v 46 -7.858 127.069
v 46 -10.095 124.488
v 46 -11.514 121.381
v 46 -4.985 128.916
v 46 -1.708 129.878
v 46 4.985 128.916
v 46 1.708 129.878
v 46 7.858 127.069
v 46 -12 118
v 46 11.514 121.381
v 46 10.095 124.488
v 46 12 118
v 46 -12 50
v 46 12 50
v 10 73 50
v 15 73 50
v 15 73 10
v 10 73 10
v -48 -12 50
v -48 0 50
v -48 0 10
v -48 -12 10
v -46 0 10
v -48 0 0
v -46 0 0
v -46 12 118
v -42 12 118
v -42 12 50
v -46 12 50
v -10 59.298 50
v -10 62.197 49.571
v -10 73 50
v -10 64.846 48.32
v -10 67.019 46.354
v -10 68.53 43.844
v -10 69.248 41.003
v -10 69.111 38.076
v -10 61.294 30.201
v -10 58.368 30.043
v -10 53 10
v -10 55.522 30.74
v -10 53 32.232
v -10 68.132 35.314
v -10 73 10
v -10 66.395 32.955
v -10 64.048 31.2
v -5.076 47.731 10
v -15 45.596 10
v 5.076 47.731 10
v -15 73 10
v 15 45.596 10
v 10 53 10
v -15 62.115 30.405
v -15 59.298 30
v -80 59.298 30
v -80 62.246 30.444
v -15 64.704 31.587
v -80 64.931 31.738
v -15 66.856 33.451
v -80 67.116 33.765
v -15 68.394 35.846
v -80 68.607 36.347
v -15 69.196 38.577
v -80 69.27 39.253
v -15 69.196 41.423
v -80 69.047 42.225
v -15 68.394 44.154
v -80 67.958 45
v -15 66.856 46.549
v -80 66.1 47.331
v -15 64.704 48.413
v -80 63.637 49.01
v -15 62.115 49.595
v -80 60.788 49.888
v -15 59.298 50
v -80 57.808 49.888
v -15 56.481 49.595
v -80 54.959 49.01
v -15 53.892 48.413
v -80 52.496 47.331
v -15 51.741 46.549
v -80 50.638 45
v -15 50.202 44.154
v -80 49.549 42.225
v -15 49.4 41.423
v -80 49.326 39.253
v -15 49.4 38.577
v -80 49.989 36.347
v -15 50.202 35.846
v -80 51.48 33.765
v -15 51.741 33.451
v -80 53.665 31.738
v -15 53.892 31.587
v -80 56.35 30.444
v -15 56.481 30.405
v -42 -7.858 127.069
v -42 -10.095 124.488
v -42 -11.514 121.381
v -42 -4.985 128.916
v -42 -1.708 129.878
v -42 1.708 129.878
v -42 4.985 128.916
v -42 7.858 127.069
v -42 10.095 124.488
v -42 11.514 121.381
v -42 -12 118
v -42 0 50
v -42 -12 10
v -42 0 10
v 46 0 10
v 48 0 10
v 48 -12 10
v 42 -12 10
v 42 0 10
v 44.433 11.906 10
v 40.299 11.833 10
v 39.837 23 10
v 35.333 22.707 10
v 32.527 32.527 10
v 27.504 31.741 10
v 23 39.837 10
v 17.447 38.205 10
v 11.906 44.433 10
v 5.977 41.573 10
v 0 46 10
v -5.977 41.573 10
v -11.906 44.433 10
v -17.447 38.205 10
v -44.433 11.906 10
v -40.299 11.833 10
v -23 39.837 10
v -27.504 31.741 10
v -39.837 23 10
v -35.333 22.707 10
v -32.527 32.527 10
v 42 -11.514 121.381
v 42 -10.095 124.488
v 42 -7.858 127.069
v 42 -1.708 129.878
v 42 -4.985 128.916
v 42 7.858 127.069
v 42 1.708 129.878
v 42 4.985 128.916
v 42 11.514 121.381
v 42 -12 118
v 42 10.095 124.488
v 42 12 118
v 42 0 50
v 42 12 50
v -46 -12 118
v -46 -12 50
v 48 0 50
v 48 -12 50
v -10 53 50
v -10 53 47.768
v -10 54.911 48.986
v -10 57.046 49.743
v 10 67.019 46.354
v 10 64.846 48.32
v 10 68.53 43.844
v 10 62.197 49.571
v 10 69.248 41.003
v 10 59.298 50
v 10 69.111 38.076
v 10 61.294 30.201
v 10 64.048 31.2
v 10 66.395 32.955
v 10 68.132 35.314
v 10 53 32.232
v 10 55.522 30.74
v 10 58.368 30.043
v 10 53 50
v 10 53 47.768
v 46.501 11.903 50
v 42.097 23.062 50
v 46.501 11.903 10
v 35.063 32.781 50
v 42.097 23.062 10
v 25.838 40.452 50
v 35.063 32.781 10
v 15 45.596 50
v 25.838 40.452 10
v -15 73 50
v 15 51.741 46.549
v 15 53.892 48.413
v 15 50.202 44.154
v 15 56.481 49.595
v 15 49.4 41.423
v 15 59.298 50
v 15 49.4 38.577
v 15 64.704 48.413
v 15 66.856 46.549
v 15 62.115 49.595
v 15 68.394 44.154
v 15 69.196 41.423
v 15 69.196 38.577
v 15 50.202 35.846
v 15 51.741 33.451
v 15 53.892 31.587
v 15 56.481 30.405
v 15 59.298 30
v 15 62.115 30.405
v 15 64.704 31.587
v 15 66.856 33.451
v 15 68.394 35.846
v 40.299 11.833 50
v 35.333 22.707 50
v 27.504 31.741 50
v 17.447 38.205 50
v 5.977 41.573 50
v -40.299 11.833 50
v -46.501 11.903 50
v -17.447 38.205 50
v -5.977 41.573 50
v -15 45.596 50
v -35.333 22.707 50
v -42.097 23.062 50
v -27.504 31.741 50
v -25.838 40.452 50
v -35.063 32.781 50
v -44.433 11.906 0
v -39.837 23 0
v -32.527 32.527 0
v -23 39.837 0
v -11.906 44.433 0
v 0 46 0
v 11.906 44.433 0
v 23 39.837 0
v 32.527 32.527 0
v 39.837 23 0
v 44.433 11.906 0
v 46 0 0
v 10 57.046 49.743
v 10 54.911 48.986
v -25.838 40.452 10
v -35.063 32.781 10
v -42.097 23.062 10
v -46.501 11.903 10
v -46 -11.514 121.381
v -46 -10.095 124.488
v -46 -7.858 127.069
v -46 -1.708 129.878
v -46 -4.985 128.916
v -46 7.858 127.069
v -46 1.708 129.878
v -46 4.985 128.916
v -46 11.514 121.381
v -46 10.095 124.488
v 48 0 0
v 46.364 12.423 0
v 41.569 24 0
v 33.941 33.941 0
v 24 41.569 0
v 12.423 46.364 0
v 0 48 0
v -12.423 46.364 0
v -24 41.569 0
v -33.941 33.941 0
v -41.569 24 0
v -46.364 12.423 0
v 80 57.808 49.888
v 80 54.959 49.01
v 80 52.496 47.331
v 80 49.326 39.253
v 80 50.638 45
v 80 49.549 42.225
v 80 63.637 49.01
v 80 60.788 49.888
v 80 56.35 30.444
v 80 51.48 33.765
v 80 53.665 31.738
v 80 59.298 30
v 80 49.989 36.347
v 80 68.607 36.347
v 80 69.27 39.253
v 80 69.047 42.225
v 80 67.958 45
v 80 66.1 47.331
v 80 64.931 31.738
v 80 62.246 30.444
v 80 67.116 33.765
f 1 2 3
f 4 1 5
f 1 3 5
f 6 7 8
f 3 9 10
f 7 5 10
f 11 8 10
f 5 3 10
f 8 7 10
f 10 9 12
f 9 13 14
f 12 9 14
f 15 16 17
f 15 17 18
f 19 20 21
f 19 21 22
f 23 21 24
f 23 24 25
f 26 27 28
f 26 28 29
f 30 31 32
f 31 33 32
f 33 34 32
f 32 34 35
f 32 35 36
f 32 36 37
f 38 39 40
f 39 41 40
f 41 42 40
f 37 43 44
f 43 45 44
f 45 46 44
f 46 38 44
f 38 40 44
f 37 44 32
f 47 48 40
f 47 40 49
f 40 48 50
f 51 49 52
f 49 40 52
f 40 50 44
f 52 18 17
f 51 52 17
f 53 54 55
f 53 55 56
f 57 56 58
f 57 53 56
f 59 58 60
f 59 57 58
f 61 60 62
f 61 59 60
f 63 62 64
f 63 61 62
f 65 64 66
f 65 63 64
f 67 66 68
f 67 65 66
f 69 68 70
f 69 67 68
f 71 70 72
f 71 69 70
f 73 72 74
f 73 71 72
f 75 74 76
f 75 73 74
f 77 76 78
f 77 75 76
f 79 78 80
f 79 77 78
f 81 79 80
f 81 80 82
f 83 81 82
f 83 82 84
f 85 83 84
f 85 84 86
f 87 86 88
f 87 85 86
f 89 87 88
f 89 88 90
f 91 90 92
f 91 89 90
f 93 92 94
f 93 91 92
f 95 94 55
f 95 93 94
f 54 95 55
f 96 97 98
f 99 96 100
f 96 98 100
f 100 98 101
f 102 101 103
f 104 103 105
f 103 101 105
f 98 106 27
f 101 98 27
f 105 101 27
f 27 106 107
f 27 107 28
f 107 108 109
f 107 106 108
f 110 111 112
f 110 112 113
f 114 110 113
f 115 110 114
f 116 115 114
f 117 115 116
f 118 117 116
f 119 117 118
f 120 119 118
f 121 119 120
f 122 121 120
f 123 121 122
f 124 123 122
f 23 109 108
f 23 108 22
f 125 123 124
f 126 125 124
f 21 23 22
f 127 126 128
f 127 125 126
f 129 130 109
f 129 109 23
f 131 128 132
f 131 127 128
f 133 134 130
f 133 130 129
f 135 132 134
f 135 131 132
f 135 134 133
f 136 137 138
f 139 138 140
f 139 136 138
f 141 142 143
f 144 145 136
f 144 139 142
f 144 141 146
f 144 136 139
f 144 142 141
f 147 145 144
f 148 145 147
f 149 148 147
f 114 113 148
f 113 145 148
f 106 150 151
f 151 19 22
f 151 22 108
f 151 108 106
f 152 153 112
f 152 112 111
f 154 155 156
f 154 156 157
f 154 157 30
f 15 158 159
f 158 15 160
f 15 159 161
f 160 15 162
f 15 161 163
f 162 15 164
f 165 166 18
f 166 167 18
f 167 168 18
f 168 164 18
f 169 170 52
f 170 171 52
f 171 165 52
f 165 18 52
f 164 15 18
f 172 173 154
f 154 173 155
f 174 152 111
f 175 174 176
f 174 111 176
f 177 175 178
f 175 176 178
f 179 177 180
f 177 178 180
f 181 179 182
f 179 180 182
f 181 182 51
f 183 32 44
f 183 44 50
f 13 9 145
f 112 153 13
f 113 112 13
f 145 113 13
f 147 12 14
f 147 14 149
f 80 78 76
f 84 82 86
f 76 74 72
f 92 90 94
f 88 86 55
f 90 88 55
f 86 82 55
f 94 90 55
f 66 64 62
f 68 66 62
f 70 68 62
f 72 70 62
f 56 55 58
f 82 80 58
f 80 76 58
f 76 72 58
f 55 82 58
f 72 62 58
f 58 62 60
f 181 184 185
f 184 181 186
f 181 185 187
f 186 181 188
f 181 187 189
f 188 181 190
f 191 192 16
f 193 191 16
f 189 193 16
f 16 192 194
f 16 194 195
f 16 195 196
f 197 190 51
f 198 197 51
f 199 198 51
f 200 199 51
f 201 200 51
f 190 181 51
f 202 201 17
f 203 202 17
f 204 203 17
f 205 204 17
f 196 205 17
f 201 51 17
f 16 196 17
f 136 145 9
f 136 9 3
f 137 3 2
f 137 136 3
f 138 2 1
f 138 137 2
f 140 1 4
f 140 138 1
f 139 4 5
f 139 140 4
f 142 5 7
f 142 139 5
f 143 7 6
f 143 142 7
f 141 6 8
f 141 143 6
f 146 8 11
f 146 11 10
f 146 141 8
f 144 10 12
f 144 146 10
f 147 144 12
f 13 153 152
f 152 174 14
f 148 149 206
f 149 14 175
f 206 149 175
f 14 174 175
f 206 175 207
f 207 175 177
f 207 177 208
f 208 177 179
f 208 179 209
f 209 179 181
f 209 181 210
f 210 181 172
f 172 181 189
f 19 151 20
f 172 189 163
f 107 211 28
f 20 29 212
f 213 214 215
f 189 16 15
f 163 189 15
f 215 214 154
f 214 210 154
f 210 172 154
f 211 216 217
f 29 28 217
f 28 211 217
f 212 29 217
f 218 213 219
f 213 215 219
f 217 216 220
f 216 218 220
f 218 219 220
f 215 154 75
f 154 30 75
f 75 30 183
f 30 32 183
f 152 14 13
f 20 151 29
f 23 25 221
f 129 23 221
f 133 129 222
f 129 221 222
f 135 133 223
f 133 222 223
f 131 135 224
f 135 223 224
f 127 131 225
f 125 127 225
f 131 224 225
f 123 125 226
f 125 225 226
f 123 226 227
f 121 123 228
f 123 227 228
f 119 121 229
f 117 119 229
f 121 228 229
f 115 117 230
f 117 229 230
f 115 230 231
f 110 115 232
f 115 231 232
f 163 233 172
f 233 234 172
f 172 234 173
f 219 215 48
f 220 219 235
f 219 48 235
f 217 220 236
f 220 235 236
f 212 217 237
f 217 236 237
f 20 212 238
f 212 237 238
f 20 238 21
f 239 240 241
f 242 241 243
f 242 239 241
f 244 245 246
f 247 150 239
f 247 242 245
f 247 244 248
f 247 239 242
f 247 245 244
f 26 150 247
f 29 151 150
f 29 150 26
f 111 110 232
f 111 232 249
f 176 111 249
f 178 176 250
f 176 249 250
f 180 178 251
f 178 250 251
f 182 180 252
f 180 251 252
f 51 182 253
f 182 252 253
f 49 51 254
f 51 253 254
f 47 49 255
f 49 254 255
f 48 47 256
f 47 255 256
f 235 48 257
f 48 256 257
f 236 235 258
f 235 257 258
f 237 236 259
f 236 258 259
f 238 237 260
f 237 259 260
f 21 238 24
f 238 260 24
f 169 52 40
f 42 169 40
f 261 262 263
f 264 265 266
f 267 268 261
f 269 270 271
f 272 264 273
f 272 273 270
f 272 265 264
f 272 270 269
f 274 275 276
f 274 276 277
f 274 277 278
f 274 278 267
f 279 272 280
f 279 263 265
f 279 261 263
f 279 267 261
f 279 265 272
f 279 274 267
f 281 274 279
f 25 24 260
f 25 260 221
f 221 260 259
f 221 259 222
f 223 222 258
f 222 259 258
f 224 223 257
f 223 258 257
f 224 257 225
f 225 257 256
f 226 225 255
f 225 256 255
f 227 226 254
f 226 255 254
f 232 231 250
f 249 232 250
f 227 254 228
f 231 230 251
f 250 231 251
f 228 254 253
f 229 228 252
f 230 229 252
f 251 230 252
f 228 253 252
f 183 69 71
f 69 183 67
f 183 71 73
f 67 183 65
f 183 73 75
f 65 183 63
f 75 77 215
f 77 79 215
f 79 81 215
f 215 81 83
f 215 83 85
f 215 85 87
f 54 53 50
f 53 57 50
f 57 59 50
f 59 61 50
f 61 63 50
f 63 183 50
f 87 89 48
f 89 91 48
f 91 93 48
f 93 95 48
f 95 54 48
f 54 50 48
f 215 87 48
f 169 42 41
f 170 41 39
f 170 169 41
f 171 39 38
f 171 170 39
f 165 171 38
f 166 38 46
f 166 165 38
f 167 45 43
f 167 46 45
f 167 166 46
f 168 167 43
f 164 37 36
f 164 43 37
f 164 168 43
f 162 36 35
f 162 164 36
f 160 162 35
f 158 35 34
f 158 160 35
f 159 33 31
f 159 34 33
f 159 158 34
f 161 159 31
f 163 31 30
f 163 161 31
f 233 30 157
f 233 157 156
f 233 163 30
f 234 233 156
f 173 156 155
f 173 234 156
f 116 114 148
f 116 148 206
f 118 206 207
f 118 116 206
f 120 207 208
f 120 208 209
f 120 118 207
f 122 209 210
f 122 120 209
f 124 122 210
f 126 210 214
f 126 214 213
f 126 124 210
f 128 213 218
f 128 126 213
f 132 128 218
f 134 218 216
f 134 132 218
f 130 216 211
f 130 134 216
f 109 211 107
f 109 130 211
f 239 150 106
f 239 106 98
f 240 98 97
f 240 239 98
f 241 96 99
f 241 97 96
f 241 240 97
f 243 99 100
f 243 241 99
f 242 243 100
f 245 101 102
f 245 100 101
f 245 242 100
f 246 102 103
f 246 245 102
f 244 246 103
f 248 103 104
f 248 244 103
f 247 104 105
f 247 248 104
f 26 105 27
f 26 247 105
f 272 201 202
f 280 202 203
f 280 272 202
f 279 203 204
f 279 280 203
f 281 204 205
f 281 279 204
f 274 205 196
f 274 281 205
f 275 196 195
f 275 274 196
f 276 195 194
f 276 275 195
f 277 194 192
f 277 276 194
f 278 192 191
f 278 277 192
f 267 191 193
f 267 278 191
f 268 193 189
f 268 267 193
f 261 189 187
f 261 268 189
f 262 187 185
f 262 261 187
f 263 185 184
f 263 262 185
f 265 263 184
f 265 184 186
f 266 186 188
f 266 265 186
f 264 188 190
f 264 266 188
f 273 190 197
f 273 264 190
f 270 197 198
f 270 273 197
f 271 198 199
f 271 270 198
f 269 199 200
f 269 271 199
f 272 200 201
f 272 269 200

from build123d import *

# Parameters (mm, degrees)
EXTRUDE_1_DEPTH     = 10
EXTRUDE_2_DEPTH     = 40
EXTRUDE_4_DEPTH     = 40
SKETCH_7_W          = 4
SKETCH_7_H          = 24
EXTRUDE_5_DEPTH     = 120
CUT_EXTRUDE_3_DEPTH = 95
SKETCH_10_R         = 10
EXTRUDE_6_DEPTH     = 80


with BuildPart() as part:
    # 草图1 → 凸台-拉伸1 (new body)
    with BuildSketch(Plane.XY):
        with BuildLine():
            Line((-48, 0), (-46, 0))
            ThreePointArc((-46, 0), (0, 46), (46, 0))
            Line((46, 0), (48, 0))
            ThreePointArc((48, 0), (0, 48), (-48, 0))
        make_face()
    extrude(amount=EXTRUDE_1_DEPTH)

    # 草图2 → 凸台-拉伸2 (add)
    with BuildSketch(Plane.XY.offset(10)):
        with BuildLine():
            Line((-48, 0), (-48, -12))
            Line((-48, -12), (-46, -12))
            Line((-46, -12), (-46, 0))
            ThreePointArc((-46, 0), (0, 46), (46, 0))
            Line((46, 0), (46, -12))
            Line((46, -12), (48, -12))
            Line((48, -12), (48, 0))
            ThreePointArc((48, 0), (38.88444419, 28.142494559), (15, 45.596052461))
            Line((15, 45.596052461), (15, 73))
            Line((15, 73), (10, 73))
            Line((10, 73), (10, 53))
            Line((10, 53), (-10, 53))
            Line((-10, 53), (-10, 73))
            Line((-10, 73), (-15, 73))
            Line((-15, 73), (-15, 45.596052461))
            ThreePointArc((-15, 45.596052461), (-38.88444419, 28.142494559), (-48, 0))
        make_face()
    extrude(amount=EXTRUDE_2_DEPTH)

    # 草图6 → 凸台-拉伸4 (add)
    with BuildSketch(Plane(origin=(0, 0, 10), x_dir=(-1, 0, 0), z_dir=(0, 0, -1))):
        with BuildLine():
            Line((-46, 0), (-42.166380906, 0))
            Line((-42.166380906, 0), (-42, 0))
            ThreePointArc((-42, 0), (0, 42), (42, 0))
            Line((42, 0), (46, 0))
            ThreePointArc((46, 0), (0, 46), (-46, 0))
        make_face()
    extrude(amount=-EXTRUDE_4_DEPTH)

    # 草图7 → 凸台-拉伸5 (add)
    with BuildSketch(Plane(origin=(0, 0, 10), x_dir=(-1, 0, 0), z_dir=(0, 0, -1))):
        with Locations((-44, 0)):
            Rectangle(SKETCH_7_W, SKETCH_7_H)
        with Locations((44, 0)):
            Rectangle(SKETCH_7_W, SKETCH_7_H)
    extrude(amount=-EXTRUDE_5_DEPTH)

    # 草图8 → 切除-拉伸3 (cut, through all)
    with BuildSketch(Plane.ZY.offset(46)):
        with BuildLine():
            Line((118, 12), (136, 12))
            Line((136, 12), (136, -12))
            Line((136, -12), (118, -12))
            ThreePointArc((118, -12), (130, 0), (118, 12))
        make_face()
    extrude(amount=-CUT_EXTRUDE_3_DEPTH, mode=Mode.SUBTRACT)

    # 草图10 → 凸台-拉伸6 (add, symmetric)
    with BuildSketch(Plane(origin=(0, 0, 0), x_dir=(0, 0, -1), z_dir=(1, 0, 0))):
        with Locations((-40, 59.29802623)):
            Circle(SKETCH_10_R)
    extrude(amount=EXTRUDE_6_DEPTH, both=True)


solid = part.part
